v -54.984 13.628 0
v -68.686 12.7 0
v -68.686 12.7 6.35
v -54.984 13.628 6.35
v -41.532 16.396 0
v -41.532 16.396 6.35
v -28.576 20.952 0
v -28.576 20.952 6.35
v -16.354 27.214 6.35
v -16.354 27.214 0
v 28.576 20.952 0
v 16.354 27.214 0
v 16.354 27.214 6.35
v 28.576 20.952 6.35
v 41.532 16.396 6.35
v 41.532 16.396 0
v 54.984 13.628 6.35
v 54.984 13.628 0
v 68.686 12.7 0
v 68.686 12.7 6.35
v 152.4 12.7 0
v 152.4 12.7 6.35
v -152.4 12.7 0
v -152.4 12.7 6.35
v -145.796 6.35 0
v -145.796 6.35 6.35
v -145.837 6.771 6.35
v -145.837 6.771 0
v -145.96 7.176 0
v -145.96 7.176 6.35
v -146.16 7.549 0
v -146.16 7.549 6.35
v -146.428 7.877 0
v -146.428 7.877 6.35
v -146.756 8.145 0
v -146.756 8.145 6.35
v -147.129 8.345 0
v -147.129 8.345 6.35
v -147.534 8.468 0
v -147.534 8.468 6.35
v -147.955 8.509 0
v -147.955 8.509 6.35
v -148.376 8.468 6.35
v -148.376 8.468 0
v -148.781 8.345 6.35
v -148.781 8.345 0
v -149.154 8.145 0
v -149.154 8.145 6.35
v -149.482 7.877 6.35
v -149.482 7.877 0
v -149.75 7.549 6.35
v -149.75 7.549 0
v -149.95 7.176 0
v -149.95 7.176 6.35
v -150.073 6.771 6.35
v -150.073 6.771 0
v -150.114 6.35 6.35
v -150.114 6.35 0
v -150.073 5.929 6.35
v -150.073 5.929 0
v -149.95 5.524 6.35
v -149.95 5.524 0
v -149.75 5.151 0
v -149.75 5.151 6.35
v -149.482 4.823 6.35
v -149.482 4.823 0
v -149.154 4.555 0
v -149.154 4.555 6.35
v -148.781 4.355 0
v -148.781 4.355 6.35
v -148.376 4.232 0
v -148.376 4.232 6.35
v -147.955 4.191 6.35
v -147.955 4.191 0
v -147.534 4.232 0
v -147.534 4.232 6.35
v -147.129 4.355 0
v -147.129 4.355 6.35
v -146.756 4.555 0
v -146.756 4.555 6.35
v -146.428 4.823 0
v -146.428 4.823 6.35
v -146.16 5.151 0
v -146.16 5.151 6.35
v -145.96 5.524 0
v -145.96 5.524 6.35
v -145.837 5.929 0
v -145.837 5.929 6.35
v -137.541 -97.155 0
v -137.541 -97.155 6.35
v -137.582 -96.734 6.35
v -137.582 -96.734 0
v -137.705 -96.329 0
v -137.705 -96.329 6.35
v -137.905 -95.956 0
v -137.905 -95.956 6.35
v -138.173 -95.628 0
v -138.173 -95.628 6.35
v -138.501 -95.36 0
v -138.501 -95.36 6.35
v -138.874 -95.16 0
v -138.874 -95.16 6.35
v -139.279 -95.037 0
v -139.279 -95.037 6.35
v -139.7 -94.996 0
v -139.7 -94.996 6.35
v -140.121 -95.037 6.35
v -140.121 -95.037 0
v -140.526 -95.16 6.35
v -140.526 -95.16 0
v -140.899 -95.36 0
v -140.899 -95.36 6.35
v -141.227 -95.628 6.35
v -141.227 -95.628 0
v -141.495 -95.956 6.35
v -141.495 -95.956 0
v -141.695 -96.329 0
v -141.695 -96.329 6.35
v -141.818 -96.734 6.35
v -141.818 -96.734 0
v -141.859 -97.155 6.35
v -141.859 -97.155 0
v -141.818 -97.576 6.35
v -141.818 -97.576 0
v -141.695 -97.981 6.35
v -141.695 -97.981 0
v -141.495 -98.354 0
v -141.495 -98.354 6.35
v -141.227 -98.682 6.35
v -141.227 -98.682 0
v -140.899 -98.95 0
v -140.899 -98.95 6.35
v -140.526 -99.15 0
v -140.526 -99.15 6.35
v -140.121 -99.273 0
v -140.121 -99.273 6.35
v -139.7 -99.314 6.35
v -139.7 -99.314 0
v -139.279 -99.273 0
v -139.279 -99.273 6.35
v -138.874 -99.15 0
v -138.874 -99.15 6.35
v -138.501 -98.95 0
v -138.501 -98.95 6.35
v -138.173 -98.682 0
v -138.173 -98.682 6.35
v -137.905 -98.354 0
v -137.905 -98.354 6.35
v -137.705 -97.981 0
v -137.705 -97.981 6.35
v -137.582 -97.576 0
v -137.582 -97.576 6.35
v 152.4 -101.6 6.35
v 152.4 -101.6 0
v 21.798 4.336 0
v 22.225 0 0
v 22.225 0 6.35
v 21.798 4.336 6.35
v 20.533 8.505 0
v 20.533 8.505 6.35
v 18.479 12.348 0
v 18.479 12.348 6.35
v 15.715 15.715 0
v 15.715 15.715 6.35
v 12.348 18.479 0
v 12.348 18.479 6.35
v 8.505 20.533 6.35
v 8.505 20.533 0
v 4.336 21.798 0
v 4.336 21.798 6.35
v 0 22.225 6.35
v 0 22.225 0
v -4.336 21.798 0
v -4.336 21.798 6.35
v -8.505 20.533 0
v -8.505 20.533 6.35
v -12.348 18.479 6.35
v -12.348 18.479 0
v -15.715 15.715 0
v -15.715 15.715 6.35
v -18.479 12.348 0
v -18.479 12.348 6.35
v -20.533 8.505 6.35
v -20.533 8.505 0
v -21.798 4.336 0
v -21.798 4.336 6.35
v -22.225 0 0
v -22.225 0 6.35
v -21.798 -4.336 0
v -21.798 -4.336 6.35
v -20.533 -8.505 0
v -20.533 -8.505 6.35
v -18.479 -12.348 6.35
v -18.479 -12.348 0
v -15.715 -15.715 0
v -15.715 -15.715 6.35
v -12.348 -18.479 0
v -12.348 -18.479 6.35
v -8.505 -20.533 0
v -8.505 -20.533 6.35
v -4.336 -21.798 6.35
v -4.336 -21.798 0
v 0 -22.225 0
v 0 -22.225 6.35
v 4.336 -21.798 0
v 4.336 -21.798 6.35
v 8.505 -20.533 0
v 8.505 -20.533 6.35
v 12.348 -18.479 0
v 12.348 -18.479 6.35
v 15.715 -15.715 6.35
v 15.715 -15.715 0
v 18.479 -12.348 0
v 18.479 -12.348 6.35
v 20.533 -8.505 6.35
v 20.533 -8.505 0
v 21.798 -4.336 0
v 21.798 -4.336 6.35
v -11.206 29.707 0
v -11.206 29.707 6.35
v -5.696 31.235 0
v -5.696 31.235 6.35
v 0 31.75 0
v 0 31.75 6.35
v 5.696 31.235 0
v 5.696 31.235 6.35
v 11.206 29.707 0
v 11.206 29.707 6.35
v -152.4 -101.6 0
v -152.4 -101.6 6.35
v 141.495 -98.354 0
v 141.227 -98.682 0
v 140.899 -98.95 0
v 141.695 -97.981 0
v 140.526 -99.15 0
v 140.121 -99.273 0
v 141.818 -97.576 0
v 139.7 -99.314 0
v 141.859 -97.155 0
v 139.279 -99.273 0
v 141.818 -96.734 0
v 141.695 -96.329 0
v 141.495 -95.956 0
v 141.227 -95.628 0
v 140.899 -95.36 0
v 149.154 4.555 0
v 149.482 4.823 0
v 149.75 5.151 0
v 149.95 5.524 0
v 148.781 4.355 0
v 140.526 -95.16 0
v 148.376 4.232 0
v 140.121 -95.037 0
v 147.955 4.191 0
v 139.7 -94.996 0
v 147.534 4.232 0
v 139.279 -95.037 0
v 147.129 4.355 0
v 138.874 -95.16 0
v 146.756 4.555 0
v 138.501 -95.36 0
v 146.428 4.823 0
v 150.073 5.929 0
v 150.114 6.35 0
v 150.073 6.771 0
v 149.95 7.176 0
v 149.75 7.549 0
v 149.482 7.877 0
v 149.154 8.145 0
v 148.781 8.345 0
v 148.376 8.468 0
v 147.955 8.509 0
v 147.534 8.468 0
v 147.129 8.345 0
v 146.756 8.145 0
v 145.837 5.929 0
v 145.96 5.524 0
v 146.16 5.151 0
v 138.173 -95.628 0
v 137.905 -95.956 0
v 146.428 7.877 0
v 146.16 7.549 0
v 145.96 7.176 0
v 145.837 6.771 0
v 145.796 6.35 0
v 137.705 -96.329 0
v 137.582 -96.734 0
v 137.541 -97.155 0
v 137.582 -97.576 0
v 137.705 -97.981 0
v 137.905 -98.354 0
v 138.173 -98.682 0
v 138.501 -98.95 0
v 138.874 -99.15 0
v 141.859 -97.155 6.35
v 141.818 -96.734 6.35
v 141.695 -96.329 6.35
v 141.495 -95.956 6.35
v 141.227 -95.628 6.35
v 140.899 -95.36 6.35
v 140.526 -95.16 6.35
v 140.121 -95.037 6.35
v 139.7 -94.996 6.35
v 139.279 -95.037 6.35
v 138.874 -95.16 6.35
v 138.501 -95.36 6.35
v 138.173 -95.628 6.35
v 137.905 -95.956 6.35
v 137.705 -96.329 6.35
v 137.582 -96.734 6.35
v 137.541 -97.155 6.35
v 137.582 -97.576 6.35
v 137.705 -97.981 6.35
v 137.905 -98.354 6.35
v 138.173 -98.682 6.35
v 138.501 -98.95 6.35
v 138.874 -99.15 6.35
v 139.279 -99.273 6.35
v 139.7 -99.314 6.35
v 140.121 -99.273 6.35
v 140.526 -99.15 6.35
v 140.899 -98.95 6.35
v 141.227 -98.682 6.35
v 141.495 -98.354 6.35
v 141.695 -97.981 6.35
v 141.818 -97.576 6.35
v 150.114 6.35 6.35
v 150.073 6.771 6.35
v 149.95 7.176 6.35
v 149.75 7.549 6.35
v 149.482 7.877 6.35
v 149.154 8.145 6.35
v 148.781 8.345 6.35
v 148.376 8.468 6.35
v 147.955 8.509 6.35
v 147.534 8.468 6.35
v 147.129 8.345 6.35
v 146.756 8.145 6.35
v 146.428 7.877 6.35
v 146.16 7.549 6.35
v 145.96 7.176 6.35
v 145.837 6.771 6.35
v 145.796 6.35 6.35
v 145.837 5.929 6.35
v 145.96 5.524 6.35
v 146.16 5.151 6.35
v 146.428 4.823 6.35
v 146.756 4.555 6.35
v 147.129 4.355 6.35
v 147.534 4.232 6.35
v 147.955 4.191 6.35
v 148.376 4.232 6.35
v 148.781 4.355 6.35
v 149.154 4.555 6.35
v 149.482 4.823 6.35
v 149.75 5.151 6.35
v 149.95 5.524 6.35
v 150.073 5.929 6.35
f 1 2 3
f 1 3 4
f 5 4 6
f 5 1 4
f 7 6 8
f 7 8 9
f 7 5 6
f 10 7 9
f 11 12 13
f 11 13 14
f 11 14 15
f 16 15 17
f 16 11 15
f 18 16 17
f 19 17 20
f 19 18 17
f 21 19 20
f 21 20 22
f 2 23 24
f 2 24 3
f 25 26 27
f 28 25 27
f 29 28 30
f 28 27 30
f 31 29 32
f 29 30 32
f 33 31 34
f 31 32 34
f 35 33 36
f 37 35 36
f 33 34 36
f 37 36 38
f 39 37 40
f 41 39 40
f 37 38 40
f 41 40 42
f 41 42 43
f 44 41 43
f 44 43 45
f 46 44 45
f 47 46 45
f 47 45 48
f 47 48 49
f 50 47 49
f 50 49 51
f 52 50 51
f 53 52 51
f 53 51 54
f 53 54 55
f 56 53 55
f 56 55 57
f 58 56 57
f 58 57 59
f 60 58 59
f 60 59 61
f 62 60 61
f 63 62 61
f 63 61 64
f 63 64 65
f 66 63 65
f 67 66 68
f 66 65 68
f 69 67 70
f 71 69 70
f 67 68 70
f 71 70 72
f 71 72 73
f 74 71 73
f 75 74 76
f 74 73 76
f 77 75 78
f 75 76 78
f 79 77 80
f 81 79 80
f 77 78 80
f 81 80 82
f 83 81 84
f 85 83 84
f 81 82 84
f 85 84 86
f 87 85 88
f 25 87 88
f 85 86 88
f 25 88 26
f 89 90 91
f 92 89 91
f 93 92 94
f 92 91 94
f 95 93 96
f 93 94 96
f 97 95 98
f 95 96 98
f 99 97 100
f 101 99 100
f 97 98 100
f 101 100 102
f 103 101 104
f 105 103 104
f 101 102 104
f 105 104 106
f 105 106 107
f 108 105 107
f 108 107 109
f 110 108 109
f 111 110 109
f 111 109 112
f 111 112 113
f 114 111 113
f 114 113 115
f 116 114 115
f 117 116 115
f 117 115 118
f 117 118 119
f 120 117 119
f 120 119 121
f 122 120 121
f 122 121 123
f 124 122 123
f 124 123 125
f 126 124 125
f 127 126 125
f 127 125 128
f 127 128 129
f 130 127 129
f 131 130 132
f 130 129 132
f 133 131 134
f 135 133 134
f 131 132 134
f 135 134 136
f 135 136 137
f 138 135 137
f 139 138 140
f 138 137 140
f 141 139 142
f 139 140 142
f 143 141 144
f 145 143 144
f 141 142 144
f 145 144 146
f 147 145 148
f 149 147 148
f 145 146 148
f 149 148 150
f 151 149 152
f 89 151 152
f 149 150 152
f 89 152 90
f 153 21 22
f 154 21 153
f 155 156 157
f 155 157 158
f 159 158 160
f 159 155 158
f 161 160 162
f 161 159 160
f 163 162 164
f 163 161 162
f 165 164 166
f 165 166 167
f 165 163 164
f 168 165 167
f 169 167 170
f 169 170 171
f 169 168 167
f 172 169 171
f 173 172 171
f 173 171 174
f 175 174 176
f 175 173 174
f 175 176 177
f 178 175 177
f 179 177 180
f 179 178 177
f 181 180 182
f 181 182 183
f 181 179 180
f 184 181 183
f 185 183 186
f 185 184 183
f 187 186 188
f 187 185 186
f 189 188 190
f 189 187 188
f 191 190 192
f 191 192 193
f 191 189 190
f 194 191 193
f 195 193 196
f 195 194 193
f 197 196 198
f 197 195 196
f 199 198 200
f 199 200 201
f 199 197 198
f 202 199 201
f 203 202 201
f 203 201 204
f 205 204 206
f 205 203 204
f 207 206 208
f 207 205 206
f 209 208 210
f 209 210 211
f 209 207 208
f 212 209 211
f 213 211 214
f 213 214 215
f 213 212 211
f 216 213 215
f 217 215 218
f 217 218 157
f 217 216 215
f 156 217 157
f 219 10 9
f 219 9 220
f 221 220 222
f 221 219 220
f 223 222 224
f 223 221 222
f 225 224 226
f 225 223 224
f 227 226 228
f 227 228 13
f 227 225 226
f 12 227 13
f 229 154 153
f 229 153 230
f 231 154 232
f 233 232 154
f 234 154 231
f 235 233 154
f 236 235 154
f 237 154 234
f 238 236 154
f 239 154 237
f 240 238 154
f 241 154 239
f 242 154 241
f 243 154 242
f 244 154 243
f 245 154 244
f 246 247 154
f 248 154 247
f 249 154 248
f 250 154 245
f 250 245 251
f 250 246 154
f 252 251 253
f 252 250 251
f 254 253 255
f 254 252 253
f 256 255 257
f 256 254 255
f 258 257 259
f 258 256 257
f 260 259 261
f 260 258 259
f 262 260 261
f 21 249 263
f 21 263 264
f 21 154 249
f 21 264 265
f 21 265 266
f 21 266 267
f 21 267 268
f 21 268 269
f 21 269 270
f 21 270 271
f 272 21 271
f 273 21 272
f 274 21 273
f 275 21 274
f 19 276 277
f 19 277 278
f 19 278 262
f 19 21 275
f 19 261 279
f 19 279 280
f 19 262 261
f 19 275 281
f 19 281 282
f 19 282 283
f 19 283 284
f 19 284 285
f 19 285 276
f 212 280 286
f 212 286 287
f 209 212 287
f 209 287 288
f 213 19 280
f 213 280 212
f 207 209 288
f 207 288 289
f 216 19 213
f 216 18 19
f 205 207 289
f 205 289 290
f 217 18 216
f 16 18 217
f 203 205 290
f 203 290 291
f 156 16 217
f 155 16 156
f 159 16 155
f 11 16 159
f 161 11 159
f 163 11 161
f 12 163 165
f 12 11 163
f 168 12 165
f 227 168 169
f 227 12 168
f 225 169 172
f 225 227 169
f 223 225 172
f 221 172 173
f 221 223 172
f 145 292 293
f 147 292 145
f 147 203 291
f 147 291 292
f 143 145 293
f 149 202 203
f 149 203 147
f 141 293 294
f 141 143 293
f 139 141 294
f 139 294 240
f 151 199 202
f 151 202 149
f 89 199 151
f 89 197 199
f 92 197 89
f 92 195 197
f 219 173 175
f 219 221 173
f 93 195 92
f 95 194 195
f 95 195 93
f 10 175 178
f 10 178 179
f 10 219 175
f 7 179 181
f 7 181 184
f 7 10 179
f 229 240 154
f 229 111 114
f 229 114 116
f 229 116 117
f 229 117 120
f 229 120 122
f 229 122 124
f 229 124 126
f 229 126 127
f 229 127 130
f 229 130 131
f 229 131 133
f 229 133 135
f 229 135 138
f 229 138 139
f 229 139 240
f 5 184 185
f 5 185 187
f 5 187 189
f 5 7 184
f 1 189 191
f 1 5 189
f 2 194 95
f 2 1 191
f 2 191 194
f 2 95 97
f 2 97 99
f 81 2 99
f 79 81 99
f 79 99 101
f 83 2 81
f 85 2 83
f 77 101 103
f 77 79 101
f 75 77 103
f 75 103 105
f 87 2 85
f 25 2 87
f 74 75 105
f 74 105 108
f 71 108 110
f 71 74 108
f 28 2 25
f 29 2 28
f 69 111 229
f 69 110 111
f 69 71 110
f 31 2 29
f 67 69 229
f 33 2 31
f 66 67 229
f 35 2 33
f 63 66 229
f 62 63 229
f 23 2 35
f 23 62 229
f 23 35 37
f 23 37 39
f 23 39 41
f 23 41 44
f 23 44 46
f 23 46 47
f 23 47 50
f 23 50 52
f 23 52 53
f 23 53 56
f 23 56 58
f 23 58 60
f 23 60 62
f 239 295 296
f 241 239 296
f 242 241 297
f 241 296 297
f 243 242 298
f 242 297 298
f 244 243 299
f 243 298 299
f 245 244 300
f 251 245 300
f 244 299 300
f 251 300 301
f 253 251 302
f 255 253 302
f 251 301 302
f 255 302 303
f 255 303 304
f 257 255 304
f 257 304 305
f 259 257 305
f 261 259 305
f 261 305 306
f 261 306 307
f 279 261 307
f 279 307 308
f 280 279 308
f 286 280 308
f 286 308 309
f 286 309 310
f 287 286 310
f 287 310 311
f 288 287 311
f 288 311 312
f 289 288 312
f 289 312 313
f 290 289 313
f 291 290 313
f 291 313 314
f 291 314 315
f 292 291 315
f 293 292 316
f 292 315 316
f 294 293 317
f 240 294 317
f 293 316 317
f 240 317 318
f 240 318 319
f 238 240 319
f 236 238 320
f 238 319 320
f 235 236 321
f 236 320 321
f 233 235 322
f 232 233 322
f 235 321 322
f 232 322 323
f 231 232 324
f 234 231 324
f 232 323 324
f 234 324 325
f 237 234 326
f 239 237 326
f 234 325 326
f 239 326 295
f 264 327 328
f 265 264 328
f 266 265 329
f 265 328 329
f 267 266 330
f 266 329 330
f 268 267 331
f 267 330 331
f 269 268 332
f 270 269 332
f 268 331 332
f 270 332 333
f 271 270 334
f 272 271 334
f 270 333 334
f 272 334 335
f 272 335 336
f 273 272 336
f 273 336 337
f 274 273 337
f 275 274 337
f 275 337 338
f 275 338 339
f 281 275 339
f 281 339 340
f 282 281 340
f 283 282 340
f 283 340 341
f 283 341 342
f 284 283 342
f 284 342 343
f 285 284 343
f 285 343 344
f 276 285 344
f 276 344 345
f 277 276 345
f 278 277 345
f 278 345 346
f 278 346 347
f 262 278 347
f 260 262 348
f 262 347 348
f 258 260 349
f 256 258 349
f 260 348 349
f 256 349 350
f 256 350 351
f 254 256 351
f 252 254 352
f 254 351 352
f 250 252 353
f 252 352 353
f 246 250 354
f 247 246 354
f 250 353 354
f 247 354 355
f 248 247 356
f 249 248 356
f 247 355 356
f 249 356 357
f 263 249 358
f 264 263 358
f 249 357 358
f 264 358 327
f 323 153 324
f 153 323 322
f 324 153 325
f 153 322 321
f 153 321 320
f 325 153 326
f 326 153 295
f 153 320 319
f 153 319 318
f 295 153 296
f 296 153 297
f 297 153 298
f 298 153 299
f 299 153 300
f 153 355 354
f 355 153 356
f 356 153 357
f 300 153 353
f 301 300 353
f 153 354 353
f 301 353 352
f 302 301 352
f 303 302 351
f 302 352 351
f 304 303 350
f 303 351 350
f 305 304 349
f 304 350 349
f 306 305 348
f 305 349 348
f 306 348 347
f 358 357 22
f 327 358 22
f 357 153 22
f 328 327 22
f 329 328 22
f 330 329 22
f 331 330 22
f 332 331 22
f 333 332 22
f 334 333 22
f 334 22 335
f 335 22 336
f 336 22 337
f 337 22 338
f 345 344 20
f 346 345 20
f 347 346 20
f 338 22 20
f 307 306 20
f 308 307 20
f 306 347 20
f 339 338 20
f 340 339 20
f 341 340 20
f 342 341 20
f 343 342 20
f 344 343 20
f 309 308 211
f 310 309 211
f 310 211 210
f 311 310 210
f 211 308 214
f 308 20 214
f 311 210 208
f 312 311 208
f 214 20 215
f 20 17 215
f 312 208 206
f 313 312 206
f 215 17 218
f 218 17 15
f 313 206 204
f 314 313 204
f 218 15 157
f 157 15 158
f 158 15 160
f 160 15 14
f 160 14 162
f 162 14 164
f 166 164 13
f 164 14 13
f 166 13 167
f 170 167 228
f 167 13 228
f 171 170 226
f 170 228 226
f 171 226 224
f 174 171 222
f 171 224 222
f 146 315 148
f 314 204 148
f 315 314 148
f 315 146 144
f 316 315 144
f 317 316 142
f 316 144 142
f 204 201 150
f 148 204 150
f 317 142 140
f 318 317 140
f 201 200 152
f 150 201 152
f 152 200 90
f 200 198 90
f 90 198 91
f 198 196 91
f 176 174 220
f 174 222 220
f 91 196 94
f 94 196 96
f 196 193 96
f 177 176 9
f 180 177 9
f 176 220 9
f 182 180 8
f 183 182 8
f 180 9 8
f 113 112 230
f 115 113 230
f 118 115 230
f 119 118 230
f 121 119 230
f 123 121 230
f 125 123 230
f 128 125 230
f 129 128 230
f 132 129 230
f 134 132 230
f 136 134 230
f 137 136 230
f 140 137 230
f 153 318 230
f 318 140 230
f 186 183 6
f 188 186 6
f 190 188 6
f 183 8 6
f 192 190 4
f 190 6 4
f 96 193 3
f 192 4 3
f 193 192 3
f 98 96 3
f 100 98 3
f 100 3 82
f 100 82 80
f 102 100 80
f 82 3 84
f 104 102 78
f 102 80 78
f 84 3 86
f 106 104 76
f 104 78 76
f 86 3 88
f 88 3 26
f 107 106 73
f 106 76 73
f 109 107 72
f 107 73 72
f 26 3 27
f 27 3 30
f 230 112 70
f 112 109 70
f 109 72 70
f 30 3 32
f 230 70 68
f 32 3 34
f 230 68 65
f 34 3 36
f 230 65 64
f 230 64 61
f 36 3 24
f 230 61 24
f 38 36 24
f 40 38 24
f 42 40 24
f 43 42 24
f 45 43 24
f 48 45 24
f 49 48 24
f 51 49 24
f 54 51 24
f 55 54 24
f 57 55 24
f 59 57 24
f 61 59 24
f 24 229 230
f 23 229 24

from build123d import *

# Parameters (mm, degrees)
SKETCH1_R           = 22.225
BOSS_EXTRUDE1_DEPTH = 6.35
SKETCH2_R           = 2.159
CUT_EXTRUDE1_DEPTH  = 7.35


with BuildPart() as part:
    # Sketch1 → Boss-Extrude1 (new body)
    with BuildSketch(Plane.XY):
        with BuildLine():
            Line((-152.4, 12.7), (-68.685751798, 12.7))
            ThreePointArc((-68.685751798, 12.7), (-41.532009619, 16.395790255), (-16.353750428, 27.214285714))
            ThreePointArc((-16.353750428, 27.214285714), (0, 31.75), (16.353750428, 27.214285714))
            ThreePointArc((16.353750428, 27.214285714), (41.532009619, 16.395790255), (68.685751798, 12.7))
            Line((68.685751798, 12.7), (152.4, 12.7))
            Line((152.4, 12.7), (152.4, -101.6))
            Line((152.4, -101.6), (-152.4, -101.6))
            Line((-152.4, -101.6), (-152.4, 12.7))
        make_face()
        Circle(SKETCH1_R, mode=Mode.SUBTRACT)
    extrude(amount=BOSS_EXTRUDE1_DEPTH)

    # Sketch2 → Cut-Extrude1 (cut, through all)
    with BuildSketch(Plane.XY.offset(6.35)):
        with Locations((-139.7, -97.155)):
            Circle(SKETCH2_R)
        with Locations((-147.955, 6.35)):
            Circle(SKETCH2_R)
        with Locations((147.955, 6.35)):
            Circle(SKETCH2_R)
        with Locations((139.7, -97.155)):
            Circle(SKETCH2_R)
    extrude(amount=-CUT_EXTRUDE1_DEPTH, mode=Mode.SUBTRACT)


solid = part.part
